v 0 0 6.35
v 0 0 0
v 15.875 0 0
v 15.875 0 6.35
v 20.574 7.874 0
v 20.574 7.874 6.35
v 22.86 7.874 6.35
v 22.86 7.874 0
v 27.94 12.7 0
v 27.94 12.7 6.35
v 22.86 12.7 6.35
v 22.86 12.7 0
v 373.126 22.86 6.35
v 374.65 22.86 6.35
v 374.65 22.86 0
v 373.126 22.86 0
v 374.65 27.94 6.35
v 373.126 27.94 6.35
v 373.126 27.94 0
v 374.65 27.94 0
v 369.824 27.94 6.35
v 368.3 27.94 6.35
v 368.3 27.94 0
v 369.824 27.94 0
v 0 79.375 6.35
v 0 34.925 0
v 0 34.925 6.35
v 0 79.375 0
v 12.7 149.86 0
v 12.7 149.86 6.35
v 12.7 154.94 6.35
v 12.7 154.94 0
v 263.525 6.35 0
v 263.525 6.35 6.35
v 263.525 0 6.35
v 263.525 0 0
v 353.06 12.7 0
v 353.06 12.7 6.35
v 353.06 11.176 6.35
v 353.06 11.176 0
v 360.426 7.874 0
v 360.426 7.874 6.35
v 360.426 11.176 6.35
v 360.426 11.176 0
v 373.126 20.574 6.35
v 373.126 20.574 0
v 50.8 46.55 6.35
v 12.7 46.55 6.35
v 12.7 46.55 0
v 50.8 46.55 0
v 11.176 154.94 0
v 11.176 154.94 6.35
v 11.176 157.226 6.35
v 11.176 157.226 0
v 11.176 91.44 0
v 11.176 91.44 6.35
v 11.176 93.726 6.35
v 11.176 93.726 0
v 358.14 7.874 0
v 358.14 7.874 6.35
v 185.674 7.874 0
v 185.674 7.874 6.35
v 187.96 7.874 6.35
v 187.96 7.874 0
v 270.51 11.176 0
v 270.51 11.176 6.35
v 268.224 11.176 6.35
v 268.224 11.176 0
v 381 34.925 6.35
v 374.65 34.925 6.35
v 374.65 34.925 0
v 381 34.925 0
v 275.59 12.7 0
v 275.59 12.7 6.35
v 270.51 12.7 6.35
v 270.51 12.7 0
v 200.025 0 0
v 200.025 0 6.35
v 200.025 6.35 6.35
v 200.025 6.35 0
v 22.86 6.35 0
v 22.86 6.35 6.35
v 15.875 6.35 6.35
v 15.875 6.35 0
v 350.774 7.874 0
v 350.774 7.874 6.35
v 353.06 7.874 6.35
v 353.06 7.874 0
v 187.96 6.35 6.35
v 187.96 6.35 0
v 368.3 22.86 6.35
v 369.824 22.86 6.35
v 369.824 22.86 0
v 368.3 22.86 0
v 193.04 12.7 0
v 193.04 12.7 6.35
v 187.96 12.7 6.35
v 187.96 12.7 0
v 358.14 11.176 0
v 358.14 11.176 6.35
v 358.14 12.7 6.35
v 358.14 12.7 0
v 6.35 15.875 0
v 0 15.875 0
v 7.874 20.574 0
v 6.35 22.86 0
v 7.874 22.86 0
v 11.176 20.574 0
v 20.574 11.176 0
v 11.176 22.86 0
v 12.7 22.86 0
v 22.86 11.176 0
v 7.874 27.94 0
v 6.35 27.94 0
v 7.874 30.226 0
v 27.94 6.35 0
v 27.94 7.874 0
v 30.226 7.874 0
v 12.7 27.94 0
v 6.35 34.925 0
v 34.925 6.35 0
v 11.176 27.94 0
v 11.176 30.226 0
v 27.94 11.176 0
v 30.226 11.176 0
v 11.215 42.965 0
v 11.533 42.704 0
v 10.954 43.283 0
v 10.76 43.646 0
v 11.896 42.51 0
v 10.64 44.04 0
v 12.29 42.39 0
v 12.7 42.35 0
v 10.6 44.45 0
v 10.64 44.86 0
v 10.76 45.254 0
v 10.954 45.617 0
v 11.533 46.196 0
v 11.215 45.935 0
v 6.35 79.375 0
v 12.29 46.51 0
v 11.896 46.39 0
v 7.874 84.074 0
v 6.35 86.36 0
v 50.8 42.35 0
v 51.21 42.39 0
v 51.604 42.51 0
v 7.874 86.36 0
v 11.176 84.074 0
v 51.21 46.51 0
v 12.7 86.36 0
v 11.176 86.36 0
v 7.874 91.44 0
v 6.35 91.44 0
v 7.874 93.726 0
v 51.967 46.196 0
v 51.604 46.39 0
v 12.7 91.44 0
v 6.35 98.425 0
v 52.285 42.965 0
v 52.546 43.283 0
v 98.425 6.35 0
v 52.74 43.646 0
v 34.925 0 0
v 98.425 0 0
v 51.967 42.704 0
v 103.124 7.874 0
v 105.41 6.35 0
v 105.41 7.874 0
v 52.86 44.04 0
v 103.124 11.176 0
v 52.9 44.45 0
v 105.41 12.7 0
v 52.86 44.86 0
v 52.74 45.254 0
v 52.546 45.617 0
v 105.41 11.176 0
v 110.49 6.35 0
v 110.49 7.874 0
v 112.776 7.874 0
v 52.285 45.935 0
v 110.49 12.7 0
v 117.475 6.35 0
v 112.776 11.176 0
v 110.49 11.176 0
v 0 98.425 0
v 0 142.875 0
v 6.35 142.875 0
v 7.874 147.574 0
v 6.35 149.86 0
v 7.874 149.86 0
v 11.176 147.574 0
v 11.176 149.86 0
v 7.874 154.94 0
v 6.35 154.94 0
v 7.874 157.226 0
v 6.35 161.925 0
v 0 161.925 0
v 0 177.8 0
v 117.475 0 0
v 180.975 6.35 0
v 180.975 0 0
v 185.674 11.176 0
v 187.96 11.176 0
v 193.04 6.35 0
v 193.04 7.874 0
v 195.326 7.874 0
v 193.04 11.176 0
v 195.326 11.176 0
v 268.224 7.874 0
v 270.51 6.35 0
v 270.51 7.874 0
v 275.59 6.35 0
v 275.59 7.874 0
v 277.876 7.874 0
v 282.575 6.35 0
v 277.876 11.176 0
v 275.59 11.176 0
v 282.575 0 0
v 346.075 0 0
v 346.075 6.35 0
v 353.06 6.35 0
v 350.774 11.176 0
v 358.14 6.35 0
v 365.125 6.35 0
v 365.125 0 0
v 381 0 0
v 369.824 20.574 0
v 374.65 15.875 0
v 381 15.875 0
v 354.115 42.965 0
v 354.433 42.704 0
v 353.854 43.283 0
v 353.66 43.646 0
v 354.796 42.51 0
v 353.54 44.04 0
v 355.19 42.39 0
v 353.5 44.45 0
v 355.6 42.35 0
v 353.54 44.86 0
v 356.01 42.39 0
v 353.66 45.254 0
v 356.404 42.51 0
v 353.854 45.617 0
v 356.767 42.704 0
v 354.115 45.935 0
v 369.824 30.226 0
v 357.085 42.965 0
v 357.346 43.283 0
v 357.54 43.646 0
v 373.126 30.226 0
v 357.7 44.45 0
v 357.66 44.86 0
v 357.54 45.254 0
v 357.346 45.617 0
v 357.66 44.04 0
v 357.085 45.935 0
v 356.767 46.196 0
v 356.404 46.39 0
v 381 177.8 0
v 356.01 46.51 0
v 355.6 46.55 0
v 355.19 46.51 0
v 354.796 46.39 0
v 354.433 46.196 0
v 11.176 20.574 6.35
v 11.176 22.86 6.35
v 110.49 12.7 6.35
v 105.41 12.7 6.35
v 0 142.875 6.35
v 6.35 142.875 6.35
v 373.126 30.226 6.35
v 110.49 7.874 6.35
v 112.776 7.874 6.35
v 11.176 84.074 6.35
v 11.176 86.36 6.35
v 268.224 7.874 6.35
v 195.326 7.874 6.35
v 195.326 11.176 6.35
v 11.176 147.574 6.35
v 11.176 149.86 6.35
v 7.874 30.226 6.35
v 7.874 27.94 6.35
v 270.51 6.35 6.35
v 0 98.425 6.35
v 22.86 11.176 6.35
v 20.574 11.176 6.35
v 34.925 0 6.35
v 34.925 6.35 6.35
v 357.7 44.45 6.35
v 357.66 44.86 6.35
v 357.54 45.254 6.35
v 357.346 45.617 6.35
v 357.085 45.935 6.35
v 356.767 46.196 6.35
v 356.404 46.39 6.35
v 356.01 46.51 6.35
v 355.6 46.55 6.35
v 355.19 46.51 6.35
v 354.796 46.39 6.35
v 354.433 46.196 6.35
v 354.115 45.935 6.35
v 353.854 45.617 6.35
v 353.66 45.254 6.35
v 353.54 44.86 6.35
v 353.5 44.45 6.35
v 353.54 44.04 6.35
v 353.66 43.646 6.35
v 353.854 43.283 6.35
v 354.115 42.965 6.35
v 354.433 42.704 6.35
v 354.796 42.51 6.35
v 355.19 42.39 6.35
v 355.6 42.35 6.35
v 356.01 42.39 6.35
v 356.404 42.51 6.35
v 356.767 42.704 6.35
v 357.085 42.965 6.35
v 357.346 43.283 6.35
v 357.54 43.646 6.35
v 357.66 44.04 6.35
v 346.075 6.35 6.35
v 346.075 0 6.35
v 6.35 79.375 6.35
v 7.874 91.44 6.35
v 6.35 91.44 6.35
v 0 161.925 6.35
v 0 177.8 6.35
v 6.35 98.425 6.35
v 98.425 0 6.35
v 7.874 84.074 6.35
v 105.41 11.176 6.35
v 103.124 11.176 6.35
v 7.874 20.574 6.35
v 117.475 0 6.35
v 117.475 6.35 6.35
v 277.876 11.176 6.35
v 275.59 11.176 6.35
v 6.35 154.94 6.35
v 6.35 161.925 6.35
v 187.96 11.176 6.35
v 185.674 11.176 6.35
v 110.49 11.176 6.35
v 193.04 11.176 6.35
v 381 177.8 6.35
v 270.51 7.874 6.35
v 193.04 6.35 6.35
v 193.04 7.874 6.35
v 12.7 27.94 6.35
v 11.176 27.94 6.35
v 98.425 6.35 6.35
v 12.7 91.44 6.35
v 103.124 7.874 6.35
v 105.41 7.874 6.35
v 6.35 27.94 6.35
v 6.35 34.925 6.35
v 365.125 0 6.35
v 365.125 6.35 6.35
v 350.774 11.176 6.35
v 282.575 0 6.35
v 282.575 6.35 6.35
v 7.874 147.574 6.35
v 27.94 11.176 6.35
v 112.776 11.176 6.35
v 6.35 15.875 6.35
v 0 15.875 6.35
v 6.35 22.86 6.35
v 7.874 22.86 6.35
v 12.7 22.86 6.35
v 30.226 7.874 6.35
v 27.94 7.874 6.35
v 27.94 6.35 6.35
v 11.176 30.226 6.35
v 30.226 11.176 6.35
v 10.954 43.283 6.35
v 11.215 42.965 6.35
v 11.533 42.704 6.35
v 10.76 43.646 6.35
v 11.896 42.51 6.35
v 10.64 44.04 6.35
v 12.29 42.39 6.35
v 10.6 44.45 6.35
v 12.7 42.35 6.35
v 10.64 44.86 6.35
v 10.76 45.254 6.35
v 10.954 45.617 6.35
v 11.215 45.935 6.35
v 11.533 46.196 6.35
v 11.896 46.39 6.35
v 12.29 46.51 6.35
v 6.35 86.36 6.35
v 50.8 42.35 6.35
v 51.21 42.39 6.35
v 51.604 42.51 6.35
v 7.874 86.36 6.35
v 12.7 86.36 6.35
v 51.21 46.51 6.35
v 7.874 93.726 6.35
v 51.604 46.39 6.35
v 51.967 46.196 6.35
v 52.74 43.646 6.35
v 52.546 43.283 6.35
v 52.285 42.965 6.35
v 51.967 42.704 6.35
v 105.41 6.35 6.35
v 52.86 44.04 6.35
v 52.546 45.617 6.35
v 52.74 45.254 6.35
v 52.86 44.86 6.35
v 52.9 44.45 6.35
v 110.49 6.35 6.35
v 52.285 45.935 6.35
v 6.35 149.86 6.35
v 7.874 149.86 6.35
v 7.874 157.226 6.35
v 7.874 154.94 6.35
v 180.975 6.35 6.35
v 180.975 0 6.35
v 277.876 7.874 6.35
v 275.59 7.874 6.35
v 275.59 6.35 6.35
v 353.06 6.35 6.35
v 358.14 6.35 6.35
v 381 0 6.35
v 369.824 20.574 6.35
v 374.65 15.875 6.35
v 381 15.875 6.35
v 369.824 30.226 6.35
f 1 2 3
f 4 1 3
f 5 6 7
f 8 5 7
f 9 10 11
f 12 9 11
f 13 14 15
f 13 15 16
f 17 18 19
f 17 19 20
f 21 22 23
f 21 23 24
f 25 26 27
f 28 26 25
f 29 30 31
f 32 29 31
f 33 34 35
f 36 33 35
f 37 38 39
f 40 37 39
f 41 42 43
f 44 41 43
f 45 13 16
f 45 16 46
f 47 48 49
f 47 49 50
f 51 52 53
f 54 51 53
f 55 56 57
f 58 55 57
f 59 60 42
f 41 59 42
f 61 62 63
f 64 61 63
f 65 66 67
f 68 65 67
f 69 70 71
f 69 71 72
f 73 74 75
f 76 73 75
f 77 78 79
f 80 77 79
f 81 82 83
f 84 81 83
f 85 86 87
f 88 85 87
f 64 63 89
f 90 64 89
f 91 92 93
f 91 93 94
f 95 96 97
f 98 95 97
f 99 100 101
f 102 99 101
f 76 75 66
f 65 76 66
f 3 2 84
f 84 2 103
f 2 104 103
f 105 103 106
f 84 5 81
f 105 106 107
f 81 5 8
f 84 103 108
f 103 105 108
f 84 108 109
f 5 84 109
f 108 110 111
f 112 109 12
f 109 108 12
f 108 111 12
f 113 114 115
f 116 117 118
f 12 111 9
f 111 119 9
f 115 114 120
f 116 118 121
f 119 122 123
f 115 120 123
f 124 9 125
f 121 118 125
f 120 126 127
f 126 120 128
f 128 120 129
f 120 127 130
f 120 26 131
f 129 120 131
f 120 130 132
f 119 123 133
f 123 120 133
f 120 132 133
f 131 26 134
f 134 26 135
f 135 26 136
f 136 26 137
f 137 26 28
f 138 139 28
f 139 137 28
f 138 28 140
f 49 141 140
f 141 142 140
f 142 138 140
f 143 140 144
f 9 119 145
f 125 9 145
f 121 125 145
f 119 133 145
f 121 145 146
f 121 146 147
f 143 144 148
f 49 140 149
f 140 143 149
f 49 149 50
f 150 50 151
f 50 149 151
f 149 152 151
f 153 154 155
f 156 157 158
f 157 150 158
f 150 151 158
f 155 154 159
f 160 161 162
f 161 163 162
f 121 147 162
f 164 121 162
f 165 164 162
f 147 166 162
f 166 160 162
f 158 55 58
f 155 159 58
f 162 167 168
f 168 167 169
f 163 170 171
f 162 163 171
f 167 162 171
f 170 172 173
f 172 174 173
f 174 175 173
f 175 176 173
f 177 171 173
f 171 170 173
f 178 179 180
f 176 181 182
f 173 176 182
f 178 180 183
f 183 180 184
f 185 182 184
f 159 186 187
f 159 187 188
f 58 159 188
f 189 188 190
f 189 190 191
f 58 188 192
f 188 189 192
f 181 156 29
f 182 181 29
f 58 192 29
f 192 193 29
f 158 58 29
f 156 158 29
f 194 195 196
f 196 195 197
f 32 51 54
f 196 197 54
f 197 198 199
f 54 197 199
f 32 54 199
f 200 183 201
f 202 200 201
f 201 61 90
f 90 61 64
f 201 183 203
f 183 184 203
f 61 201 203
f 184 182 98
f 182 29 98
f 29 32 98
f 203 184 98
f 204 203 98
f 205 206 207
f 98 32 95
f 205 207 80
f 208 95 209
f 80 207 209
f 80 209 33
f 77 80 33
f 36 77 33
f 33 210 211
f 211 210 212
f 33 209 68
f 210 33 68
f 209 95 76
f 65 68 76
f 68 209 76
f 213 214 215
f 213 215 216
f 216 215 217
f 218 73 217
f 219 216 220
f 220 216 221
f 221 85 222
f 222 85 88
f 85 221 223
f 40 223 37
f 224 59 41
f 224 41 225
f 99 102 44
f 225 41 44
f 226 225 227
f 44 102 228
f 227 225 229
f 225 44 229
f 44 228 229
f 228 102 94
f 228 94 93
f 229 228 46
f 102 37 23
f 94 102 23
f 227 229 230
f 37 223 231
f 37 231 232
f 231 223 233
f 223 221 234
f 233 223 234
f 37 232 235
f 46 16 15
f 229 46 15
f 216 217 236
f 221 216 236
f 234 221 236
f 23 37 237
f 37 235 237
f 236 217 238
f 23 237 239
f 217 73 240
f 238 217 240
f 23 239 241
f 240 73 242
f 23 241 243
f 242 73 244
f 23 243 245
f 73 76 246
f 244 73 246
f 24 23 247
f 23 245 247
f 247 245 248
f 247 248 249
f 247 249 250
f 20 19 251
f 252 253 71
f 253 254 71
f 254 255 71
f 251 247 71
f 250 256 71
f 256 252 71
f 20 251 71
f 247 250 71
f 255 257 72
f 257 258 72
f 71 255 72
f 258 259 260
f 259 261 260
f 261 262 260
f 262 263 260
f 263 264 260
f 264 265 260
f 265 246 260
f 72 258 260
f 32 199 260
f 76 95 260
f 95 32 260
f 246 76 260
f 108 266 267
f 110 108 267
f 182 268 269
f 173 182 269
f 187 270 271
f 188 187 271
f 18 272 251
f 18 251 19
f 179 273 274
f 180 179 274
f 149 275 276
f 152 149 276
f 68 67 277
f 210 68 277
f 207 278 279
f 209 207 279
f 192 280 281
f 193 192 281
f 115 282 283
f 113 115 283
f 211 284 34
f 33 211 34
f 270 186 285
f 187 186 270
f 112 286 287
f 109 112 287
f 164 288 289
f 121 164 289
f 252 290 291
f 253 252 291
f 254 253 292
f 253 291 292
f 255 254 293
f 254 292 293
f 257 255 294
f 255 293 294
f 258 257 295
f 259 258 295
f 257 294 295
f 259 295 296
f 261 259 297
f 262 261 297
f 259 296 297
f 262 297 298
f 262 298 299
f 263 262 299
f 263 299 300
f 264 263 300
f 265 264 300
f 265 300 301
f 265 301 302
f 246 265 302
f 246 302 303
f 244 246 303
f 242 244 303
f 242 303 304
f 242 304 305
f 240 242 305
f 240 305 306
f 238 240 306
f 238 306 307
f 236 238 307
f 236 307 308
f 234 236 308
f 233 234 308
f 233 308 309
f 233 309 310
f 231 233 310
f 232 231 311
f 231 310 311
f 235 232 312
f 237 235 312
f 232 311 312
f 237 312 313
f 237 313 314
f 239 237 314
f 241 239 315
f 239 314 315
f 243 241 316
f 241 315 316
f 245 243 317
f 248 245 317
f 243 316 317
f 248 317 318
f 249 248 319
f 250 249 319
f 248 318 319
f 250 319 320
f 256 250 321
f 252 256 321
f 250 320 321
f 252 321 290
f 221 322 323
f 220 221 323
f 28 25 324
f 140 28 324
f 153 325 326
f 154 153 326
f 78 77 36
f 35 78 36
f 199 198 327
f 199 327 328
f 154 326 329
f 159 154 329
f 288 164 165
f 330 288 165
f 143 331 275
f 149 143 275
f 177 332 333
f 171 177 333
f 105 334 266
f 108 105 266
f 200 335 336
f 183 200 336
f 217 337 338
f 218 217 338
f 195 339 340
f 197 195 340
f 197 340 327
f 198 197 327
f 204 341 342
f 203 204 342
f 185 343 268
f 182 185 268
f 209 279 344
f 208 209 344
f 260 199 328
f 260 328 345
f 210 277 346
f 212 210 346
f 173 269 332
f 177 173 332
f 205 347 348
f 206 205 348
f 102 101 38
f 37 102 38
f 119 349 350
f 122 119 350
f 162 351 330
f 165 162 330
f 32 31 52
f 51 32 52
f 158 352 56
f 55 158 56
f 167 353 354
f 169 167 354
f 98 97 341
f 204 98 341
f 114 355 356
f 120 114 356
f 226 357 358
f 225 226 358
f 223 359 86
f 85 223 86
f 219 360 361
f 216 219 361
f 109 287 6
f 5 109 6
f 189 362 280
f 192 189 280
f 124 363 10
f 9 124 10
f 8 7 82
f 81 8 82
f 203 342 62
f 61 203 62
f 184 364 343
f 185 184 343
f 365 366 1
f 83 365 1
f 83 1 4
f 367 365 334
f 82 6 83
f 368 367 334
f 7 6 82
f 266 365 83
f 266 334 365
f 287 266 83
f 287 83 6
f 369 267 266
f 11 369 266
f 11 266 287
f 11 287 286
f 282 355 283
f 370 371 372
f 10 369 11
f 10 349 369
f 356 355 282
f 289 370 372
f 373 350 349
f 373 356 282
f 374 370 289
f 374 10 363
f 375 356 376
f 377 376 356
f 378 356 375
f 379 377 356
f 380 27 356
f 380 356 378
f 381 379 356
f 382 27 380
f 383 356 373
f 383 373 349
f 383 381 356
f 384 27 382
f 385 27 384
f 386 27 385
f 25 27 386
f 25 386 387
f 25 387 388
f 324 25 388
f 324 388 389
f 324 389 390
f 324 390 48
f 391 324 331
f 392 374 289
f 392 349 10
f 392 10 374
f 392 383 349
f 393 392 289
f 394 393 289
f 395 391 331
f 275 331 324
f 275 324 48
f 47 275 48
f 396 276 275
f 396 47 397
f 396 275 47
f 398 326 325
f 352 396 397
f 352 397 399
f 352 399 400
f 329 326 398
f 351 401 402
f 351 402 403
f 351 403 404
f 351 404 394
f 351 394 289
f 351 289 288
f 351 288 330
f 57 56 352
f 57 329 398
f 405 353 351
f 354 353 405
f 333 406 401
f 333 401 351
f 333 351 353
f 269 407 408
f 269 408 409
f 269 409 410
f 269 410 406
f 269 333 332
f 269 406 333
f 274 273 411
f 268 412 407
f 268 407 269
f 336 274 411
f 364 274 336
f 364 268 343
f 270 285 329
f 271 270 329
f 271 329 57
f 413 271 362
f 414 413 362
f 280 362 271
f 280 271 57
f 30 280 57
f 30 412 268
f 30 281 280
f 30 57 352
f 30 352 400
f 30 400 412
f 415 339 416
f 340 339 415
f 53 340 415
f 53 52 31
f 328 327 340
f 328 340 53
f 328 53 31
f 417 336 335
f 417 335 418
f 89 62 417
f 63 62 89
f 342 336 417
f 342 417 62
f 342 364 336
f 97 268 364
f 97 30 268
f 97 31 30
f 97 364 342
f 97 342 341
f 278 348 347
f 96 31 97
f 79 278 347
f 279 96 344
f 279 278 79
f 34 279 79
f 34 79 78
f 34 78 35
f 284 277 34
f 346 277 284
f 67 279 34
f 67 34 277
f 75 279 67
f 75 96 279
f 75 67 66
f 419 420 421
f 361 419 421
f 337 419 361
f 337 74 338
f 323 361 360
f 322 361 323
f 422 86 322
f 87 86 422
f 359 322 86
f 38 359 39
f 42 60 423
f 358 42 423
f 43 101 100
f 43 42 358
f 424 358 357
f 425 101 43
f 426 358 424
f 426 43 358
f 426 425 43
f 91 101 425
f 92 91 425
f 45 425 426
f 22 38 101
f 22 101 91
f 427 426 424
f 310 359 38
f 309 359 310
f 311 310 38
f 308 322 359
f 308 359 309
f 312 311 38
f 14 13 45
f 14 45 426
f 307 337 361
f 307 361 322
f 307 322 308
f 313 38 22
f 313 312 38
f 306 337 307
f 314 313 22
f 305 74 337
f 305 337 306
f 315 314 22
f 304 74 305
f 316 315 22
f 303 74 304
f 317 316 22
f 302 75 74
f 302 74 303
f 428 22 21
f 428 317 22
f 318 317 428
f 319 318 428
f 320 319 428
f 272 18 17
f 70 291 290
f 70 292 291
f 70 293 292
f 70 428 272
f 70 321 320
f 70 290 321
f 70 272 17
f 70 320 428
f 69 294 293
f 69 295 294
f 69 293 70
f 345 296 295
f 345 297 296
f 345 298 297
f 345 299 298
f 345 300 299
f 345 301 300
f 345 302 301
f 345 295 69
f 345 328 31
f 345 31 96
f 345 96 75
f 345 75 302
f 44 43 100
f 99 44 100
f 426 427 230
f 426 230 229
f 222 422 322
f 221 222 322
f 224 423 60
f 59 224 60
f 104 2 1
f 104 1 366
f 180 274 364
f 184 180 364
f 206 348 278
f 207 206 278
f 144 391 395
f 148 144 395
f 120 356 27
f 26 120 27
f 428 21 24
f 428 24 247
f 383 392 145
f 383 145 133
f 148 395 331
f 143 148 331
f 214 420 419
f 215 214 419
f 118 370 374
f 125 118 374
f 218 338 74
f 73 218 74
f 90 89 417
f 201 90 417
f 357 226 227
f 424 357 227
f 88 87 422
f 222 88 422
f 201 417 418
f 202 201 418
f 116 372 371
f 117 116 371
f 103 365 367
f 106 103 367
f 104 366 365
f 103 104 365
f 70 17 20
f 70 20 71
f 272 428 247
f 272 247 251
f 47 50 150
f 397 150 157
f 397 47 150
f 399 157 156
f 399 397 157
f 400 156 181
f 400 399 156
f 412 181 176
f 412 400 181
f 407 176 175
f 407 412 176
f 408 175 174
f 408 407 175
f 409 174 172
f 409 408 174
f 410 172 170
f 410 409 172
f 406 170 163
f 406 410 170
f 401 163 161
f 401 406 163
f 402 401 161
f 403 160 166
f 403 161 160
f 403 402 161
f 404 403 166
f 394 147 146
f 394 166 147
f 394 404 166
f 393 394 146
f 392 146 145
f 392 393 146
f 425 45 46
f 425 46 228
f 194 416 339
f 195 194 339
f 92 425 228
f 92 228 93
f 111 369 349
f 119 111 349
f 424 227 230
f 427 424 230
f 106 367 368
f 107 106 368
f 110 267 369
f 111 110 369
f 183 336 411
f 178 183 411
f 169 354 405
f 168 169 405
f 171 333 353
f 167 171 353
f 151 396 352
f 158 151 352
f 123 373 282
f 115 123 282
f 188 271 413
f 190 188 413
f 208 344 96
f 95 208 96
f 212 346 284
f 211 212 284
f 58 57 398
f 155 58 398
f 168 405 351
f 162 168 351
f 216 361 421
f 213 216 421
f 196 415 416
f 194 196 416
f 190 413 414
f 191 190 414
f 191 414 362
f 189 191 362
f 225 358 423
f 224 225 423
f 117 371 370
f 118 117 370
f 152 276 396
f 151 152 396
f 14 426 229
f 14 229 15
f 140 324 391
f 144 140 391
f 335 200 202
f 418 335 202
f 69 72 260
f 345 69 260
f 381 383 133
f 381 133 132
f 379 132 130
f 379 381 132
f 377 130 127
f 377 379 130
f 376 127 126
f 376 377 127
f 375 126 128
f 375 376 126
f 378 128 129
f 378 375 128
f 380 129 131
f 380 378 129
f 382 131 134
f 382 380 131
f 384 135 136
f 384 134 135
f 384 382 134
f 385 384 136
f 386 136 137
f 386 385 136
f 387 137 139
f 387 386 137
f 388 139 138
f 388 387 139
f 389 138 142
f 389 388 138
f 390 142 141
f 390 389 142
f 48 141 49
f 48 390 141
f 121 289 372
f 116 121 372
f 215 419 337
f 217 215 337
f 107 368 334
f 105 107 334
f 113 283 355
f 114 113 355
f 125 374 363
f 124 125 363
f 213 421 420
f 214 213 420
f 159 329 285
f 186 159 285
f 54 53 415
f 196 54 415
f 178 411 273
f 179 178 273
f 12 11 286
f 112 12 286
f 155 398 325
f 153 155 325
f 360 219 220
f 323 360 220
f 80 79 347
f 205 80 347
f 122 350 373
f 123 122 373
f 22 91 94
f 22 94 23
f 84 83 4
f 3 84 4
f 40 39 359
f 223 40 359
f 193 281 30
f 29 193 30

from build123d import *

# Parameters (mm, degrees)
SKETCH1_W           = 381
SKETCH1_H           = 177.8
BOSS_EXTRUDE1_DEPTH = 6.35
CUT_EXTRUDE1_DEPTH  = 421.492761531
CUT_EXTRUDE2_DEPTH  = 421.492761531
LPATTERN1_COUNT     = 5
LPATTERN1_PITCH     = 82.55
SKETCH7_R           = 2.1
CUT_EXTRUDE3_DEPTH  = 421.492761531
CUT_EXTRUDE4_DEPTH  = 421.492761531
LPATTERN3_COUNT     = 2
LPATTERN3_PITCH     = 63.5
CUT_EXTRUDE5_DEPTH  = 421.492761531


with BuildPart() as part:
    # Sketch1 → Boss-Extrude1 (new body)
    with BuildSketch(Plane.XY):
        with Locations((190.5, 88.9)):
            Rectangle(SKETCH1_W, SKETCH1_H)
    extrude(amount=BOSS_EXTRUDE1_DEPTH)

    # Sketch2 → Cut-Extrude1 (cut, through all)
    with BuildSketch(Plane.XY.offset(6.35)):
        with BuildLine():
            Line((12.7, 46.55), (50.8, 46.55))
            ThreePointArc((50.8, 46.55), (52.9, 44.45), (50.8, 42.35))
            Line((50.8, 42.35), (12.7, 42.35))
            ThreePointArc((12.7, 42.35), (10.6, 44.45), (12.7, 46.55))
        make_face()
    extrude(amount=-CUT_EXTRUDE1_DEPTH, mode=Mode.SUBTRACT)

    # Sketch6 → Cut-Extrude2 (cut, through all)
    with BuildSketch(Plane.XY.offset(6.35)):
        Polygon((15.875, 0), (34.925, 0), (34.925, 6.35), (27.94, 6.35), (27.94, 7.874), (30.226, 7.874), (30.226, 11.176), (27.94, 11.176), (27.94, 12.7), (22.86, 12.7), (22.86, 11.176), (20.574, 11.176), (20.574, 7.874), (22.86, 7.874), (22.86, 6.35), (15.875, 6.35), align=None)
    cut_extrude2 = extrude(amount=-CUT_EXTRUDE2_DEPTH, mode=Mode.SUBTRACT)

    # LPattern1: Cut-Extrude2 ×5
    with Locations(*[(i * LPATTERN1_PITCH, 0, 0) for i in range(1, LPATTERN1_COUNT)]):
        add(cut_extrude2, mode=Mode.SUBTRACT)

    # Sketch7 → Cut-Extrude3 (cut, through all)
    with BuildSketch(Plane.XY.offset(6.35)):
        with Locations((355.6, 44.45)):
            Circle(SKETCH7_R)
    extrude(amount=-CUT_EXTRUDE3_DEPTH, mode=Mode.SUBTRACT)

    # Sketch8 → Cut-Extrude4 (cut, through all)
    with BuildSketch(Plane.XY.offset(6.35)):
        Polygon((0, 161.925), (0, 142.875), (6.35, 142.875), (6.35, 149.86), (7.874, 149.86), (7.874, 147.574), (11.176, 147.574), (11.176, 149.86), (12.7, 149.86), (12.7, 154.94), (11.176, 154.94), (11.176, 157.226), (7.874, 157.226), (7.874, 154.94), (6.35, 154.94), (6.35, 161.925), align=None)
    cut_extrude4 = extrude(amount=-CUT_EXTRUDE4_DEPTH, mode=Mode.SUBTRACT)

    # LPattern3: Cut-Extrude4 ×2
    with Locations(*[(0, -i * LPATTERN3_PITCH, 0) for i in range(1, LPATTERN3_COUNT)]):
        add(cut_extrude4, mode=Mode.SUBTRACT)

    # Sketch9 → Cut-Extrude5 (cut, through all)
    with BuildSketch(Plane.XY.offset(6.35)):
        Polygon((0, 34.925), (0, 15.875), (6.35, 15.875), (6.35, 22.86), (7.874, 22.86), (7.874, 20.574), (11.176, 20.574), (11.176, 22.86), (12.7, 22.86), (12.7, 27.94), (11.176, 27.94), (11.176, 30.226), (7.874, 30.226), (7.874, 27.94), (6.35, 27.94), (6.35, 34.925), align=None)
    cut_extrude5 = extrude(amount=-CUT_EXTRUDE5_DEPTH, mode=Mode.SUBTRACT)

    # Mirror2: Cut-Extrude5 across plane
    add(cut_extrude5.mirror(Plane.ZY.offset(-190.5)), mode=Mode.SUBTRACT)


solid = part.part
